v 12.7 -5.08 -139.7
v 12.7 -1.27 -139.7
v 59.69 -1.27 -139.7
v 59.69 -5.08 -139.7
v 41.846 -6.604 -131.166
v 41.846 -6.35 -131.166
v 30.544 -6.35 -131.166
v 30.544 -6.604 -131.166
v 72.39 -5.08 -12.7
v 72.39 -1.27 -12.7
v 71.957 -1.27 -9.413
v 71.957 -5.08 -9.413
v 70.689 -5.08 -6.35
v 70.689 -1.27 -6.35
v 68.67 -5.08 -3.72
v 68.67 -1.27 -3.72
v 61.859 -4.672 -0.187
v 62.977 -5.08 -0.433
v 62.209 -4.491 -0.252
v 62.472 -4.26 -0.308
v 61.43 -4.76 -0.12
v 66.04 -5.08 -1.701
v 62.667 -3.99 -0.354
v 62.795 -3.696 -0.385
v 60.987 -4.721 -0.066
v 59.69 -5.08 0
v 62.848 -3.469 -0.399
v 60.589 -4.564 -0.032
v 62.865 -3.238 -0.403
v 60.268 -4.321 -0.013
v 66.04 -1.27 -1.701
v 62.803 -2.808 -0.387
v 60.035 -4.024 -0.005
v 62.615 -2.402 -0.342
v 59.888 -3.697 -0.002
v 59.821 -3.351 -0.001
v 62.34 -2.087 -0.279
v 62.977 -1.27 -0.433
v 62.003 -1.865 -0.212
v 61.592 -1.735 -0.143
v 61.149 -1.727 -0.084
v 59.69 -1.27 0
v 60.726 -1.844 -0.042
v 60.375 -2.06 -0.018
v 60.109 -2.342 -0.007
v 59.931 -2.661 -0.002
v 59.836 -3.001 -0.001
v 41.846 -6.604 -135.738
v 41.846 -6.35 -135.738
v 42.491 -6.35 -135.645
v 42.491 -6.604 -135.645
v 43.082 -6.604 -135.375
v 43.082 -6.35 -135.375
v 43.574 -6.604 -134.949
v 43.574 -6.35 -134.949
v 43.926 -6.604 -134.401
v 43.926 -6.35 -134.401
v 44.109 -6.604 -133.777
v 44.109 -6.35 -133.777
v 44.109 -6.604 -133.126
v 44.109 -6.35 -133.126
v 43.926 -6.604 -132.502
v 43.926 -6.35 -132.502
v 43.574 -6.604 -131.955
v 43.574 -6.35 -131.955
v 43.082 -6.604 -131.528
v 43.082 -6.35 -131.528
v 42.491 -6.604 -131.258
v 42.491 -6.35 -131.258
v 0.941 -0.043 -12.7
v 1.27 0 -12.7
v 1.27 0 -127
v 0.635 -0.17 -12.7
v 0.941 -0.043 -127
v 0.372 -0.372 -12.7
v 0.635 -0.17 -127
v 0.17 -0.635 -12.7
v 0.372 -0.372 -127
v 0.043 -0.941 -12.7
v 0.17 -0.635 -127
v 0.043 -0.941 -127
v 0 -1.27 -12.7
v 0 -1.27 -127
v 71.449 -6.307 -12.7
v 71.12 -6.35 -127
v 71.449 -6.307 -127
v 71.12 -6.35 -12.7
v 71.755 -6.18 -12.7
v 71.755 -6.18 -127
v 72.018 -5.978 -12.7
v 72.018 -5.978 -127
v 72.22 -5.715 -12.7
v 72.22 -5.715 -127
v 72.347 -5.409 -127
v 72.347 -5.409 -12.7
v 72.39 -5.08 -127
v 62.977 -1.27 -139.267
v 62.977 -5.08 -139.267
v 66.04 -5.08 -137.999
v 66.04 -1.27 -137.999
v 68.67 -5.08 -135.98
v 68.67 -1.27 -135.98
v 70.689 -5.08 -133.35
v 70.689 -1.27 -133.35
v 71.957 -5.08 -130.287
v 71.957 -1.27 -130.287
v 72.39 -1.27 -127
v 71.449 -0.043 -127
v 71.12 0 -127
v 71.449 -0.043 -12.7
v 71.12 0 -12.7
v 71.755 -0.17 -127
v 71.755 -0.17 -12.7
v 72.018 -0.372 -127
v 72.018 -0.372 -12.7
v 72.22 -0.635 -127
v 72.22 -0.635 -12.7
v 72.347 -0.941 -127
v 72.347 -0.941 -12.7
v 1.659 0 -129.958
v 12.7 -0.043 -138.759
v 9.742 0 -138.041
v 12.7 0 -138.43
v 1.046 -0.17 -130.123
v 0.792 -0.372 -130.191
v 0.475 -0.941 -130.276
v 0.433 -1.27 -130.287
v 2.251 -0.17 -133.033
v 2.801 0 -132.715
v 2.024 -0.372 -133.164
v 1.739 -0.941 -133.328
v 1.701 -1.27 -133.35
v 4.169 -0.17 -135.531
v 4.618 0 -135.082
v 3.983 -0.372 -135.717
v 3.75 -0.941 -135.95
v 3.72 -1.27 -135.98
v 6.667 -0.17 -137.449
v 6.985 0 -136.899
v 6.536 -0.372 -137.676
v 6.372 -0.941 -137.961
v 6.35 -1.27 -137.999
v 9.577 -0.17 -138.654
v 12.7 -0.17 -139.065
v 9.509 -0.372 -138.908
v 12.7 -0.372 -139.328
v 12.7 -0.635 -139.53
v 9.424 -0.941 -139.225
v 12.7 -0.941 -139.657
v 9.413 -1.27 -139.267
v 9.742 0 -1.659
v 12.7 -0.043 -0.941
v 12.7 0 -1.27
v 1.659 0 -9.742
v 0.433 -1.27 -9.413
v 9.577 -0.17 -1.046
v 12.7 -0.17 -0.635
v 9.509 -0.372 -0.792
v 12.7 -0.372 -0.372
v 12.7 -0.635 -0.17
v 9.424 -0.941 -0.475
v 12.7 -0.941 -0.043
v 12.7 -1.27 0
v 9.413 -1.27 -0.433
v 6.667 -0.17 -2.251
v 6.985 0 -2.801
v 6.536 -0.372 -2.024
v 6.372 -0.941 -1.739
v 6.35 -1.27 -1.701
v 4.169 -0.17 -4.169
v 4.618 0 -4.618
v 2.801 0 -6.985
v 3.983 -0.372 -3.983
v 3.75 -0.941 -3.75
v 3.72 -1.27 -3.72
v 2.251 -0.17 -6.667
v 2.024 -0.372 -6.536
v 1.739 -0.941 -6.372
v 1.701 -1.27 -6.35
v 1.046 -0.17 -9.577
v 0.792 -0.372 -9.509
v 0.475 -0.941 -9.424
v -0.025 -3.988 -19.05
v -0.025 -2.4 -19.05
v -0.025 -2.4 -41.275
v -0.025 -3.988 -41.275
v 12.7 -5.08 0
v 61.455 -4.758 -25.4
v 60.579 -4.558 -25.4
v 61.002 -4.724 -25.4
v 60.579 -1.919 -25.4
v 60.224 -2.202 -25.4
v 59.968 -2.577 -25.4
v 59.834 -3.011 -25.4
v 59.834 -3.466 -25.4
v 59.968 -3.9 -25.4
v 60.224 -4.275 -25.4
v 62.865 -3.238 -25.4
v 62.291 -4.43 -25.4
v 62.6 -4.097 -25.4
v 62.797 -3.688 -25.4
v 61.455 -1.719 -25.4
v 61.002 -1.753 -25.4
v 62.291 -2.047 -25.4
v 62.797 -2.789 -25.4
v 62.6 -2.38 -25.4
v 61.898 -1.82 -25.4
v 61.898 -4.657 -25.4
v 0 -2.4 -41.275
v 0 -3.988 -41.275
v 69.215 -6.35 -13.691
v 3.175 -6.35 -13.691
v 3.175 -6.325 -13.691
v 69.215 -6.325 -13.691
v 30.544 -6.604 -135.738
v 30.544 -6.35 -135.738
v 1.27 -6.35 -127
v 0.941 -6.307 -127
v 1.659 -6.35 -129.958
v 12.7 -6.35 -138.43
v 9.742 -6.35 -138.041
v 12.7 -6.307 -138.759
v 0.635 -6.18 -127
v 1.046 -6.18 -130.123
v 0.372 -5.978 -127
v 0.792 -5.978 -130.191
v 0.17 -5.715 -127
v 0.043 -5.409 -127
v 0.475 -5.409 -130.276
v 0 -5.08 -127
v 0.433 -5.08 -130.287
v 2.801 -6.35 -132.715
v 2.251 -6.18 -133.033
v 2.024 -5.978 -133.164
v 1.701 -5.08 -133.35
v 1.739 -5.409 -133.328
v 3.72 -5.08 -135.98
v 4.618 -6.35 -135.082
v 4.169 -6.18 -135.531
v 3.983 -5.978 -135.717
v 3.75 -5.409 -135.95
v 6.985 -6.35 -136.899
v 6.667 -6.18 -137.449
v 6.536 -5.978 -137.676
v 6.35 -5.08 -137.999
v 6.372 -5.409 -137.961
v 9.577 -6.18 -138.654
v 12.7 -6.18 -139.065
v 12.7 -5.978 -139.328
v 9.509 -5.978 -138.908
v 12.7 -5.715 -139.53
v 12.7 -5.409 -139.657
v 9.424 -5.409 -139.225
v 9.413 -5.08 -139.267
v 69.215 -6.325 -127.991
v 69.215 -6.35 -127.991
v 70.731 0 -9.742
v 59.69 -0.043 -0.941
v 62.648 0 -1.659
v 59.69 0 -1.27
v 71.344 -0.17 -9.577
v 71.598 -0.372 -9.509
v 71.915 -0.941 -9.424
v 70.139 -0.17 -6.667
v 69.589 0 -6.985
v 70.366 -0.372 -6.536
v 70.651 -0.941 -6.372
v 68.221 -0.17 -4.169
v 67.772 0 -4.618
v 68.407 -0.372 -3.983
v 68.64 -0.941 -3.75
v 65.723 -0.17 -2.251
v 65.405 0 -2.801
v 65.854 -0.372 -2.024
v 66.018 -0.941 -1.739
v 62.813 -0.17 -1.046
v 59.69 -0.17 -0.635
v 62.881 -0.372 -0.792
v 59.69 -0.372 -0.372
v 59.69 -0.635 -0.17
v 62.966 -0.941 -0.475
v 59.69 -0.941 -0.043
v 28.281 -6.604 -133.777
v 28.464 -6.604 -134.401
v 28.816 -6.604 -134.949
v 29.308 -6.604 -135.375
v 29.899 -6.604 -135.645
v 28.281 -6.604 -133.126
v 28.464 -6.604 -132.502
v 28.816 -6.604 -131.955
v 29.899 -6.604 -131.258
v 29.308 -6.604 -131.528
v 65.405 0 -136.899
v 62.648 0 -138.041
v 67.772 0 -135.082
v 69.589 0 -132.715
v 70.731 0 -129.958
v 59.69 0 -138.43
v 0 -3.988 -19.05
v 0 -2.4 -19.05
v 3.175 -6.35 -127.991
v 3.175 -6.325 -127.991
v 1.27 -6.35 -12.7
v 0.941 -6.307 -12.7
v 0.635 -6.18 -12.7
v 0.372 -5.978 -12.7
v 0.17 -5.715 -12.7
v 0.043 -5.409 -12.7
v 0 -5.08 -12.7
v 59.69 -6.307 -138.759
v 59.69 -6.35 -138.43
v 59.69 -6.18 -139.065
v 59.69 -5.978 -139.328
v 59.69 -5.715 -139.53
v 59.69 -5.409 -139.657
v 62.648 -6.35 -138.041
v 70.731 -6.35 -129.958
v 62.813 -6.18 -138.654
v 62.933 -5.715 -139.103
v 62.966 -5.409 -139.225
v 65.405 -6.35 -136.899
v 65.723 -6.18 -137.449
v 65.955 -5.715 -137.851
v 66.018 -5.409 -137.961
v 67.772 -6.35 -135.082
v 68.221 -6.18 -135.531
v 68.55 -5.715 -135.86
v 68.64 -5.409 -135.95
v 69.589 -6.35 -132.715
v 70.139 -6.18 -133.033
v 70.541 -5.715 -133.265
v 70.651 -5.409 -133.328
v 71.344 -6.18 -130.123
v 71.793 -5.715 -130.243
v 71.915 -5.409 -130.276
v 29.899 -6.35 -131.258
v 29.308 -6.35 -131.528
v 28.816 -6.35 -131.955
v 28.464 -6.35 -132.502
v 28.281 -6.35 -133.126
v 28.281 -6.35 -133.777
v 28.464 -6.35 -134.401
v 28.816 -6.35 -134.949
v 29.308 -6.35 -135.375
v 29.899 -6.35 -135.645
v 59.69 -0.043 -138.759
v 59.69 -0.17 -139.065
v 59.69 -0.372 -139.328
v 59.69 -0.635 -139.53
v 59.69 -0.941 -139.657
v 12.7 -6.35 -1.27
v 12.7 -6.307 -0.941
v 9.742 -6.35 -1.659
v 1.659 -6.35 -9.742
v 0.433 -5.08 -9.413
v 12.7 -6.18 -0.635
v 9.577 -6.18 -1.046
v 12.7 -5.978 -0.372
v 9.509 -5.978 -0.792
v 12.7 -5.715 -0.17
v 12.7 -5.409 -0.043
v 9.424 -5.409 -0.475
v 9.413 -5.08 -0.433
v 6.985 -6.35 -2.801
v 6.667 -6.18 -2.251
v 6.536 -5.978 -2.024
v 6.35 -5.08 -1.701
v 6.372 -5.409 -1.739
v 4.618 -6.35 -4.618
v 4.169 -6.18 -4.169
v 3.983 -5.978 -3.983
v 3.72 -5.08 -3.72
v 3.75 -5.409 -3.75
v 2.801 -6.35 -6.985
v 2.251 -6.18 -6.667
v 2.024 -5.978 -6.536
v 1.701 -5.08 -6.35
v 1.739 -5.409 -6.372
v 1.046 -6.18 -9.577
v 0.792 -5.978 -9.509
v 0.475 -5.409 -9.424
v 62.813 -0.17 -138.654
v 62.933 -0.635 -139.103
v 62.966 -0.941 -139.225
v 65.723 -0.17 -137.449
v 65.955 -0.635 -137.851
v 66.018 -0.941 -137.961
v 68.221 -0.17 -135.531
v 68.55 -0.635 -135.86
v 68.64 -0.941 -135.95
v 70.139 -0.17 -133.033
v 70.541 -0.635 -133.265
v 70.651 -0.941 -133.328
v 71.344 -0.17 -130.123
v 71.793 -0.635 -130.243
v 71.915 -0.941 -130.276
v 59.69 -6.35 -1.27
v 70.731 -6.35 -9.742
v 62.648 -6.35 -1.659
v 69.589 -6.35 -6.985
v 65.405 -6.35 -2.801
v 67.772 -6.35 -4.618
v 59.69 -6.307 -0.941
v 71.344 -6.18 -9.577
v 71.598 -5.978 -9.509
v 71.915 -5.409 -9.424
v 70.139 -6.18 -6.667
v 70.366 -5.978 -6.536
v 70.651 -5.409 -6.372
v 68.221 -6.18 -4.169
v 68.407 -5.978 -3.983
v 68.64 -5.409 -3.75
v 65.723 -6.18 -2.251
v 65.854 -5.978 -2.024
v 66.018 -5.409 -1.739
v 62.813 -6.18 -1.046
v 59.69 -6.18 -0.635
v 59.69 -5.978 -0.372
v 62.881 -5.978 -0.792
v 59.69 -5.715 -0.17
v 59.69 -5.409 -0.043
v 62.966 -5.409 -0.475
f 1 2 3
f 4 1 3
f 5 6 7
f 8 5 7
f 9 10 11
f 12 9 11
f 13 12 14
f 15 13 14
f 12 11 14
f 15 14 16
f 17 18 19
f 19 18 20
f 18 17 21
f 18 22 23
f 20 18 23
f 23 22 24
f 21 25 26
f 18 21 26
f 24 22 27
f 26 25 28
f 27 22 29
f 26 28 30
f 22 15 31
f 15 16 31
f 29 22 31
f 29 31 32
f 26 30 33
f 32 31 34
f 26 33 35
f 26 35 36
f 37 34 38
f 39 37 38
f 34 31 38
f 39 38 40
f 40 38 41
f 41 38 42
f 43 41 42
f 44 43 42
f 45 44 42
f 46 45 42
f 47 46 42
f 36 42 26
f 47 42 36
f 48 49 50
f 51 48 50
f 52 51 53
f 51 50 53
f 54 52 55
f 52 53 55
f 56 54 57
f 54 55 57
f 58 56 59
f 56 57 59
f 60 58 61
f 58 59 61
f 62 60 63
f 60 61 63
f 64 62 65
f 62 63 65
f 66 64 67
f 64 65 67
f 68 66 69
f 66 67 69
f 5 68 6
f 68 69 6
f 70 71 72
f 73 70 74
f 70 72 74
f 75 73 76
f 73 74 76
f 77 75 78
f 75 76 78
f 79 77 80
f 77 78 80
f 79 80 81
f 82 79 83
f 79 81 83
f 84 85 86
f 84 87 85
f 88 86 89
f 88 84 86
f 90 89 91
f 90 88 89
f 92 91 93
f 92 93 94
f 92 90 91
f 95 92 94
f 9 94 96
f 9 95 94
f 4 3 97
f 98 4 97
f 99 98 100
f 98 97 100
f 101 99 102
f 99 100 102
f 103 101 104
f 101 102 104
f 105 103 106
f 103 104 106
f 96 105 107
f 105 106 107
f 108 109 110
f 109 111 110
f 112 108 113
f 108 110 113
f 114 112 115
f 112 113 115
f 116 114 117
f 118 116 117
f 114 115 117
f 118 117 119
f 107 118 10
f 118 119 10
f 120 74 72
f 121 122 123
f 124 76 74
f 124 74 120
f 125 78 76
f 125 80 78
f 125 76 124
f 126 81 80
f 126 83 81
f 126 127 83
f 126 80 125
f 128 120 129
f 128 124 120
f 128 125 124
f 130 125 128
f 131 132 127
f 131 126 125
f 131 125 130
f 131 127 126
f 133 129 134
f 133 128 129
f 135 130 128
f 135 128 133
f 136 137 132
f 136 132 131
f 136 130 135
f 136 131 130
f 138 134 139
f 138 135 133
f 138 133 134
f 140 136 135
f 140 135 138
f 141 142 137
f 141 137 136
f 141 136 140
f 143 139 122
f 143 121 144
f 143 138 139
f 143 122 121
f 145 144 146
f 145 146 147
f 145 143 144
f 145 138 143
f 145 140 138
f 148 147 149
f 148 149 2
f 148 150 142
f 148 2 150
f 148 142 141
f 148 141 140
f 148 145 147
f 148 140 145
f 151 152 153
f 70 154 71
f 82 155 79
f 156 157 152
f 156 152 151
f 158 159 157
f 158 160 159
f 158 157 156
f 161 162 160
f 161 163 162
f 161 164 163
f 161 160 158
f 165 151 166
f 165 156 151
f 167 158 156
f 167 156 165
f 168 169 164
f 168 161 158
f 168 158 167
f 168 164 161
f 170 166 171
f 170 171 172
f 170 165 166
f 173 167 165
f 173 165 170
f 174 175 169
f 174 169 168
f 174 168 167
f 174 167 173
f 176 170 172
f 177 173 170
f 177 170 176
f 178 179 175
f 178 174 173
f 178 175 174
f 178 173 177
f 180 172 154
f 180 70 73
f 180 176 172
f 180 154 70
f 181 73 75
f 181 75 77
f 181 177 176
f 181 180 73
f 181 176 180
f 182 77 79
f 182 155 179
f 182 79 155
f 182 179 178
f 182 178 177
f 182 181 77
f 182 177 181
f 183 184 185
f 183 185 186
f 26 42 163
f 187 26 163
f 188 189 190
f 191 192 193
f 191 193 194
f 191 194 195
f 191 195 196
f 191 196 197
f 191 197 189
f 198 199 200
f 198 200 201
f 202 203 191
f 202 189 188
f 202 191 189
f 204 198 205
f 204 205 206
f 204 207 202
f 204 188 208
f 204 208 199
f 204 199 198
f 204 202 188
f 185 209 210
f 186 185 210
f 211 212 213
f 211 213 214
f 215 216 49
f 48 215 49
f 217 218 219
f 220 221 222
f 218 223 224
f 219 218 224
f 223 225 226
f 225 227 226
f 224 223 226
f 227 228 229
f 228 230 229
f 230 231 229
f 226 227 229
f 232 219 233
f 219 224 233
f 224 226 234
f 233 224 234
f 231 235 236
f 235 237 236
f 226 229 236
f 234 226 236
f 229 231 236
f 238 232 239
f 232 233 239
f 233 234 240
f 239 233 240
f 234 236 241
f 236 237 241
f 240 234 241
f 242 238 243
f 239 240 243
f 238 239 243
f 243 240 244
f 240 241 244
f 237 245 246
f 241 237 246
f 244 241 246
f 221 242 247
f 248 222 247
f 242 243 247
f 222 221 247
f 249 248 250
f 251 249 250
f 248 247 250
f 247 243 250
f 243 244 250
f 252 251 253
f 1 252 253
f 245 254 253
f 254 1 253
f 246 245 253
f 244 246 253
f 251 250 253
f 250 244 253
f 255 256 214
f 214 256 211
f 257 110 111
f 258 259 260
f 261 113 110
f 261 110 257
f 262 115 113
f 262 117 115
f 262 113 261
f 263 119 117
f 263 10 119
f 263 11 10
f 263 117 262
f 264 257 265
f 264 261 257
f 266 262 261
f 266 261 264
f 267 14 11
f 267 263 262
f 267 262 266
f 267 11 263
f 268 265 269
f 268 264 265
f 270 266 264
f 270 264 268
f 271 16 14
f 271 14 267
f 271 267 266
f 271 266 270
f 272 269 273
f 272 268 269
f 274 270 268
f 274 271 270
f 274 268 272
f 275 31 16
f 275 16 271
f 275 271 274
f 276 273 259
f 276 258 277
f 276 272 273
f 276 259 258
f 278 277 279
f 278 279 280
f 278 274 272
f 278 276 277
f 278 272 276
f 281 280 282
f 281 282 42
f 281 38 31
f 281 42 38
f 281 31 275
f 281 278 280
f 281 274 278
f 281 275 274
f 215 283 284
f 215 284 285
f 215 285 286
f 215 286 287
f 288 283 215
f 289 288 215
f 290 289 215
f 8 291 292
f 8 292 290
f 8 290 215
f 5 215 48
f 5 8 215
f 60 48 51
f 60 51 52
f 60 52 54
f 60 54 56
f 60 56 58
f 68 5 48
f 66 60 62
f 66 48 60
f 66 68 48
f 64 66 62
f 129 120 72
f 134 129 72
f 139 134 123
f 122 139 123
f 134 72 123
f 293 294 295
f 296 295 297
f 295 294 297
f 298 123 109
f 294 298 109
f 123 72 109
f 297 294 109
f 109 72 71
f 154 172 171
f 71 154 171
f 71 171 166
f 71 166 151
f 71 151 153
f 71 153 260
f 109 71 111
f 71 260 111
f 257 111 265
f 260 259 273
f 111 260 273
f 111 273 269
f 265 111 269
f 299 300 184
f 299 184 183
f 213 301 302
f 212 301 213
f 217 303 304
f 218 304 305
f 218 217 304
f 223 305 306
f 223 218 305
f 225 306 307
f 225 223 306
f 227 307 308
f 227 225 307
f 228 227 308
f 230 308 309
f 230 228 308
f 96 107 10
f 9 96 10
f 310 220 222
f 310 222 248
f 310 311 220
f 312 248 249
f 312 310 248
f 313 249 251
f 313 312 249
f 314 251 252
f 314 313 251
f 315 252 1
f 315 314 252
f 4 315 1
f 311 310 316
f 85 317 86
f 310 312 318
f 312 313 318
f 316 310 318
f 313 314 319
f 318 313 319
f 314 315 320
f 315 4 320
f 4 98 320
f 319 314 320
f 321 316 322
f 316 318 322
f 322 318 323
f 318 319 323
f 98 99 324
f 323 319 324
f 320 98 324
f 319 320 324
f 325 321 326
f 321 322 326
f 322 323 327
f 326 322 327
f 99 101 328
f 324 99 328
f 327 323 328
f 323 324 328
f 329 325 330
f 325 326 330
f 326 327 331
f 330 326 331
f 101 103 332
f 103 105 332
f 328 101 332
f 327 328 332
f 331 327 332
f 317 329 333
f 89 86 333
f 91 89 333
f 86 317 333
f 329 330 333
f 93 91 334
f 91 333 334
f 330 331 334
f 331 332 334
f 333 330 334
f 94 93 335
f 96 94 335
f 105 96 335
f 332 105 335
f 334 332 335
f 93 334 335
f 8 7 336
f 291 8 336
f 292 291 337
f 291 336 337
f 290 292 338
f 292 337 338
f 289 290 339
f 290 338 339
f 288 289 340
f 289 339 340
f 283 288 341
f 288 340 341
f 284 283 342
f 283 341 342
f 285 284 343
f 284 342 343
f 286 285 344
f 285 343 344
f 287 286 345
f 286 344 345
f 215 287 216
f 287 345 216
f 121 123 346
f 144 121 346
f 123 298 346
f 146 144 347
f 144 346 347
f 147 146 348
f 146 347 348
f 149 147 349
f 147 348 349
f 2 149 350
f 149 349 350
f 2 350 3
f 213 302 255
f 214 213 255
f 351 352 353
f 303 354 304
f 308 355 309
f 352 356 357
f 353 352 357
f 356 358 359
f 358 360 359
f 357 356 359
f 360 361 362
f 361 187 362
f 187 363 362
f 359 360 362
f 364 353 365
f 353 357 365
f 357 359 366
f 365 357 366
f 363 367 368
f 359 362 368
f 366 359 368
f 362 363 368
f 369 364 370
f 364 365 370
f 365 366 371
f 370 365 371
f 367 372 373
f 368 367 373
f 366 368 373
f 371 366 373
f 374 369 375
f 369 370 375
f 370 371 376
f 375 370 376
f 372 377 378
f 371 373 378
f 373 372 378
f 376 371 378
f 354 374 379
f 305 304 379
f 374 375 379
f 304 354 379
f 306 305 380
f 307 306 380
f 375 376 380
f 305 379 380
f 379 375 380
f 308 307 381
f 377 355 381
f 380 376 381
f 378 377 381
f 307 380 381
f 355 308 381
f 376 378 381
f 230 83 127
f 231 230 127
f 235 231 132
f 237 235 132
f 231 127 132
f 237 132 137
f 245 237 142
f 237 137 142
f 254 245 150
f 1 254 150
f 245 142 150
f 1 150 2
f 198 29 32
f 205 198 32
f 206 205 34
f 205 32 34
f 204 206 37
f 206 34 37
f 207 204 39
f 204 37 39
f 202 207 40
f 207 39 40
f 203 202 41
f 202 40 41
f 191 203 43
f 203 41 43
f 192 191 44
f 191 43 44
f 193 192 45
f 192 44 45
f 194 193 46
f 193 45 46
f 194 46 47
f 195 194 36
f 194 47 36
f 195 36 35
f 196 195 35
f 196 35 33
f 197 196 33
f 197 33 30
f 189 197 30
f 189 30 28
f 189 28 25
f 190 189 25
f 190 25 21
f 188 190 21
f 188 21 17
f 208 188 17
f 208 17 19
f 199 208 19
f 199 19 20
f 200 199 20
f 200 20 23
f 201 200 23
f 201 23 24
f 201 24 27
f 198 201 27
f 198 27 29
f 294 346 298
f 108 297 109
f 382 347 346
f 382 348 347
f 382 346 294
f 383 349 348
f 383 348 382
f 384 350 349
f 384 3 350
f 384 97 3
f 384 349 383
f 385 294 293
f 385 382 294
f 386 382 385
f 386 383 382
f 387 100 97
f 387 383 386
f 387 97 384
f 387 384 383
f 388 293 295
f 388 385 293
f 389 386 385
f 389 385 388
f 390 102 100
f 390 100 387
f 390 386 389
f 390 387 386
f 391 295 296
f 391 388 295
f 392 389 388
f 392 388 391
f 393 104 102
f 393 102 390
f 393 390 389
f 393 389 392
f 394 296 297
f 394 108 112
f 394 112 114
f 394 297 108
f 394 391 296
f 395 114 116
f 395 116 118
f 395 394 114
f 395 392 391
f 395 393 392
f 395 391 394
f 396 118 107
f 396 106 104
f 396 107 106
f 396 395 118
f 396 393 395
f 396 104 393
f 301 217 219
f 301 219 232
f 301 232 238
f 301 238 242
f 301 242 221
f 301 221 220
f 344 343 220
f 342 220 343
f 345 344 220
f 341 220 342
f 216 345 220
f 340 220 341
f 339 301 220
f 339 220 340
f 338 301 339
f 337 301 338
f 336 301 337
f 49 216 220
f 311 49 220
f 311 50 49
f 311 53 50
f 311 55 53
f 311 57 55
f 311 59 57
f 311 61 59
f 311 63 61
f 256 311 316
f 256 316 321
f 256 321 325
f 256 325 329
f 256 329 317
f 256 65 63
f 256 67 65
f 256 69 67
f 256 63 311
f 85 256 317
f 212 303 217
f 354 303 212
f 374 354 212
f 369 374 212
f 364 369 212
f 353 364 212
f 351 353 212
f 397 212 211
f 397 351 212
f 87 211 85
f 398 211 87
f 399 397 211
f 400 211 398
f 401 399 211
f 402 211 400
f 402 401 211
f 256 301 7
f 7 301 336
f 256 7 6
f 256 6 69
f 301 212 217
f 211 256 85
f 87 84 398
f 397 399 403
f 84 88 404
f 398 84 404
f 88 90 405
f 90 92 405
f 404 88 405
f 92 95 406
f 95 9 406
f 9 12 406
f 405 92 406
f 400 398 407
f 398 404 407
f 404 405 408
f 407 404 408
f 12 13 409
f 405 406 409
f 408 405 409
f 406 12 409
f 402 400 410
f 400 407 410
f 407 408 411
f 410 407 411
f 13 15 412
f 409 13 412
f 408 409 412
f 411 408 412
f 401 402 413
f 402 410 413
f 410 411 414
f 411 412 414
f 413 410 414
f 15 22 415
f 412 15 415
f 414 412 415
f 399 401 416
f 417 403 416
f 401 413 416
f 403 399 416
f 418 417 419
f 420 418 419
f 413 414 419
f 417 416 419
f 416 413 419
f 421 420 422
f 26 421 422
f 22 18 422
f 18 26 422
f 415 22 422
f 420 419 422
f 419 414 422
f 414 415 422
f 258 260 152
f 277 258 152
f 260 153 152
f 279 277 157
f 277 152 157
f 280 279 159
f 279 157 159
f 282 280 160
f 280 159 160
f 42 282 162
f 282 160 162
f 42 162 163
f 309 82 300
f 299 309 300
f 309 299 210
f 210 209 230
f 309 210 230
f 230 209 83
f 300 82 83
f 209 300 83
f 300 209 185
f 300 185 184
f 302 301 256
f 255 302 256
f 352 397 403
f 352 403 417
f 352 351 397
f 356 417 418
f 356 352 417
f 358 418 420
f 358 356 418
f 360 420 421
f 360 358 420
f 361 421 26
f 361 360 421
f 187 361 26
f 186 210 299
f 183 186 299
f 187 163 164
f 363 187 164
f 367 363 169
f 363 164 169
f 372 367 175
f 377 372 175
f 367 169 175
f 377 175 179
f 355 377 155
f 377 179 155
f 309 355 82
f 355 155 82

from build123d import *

# Parameters (mm, degrees)
F1_DEPTH  = 6.35
F3_DEPTH  = 0.254
F4_R      = 1.27
F5_W      = 66.04
F5_H      = 114.3
F6_DEPTH  = 0.0254
F8_W      = 1.5875
F8_H      = 22.225
F9_DEPTH  = 0.0254
F11_R     = 1.524
F12_DEPTH = 25.4


with BuildPart() as f1:
    # F0 (on Front) → F1 (new body)
    with BuildSketch(Plane.XZ):
        with BuildLine():
            Line((59.69, 0), (12.7, 0))
            ThreePointArc((12.7, 0), (3.7197438789, -3.7197438789), (0, -12.7))
            Line((0, -12.7), (0, -127))
            ThreePointArc((0, -127), (3.7197438789, -135.9802561211), (12.7, -139.7))
            Line((12.7, -139.7), (59.69, -139.7))
            ThreePointArc((59.69, -139.7), (68.6702561211, -135.9802561211), (72.39, -127))
            Line((72.39, -127), (72.39, -12.7))
            ThreePointArc((72.39, -12.7), (68.6702561211, -3.7197438789), (59.69, 0))
        make_face()
    extrude(amount=F1_DEPTH)

    # F2 (on face) → F3 (join)
    with BuildSketch(Plane.XZ.offset(6.35)):
        with BuildLine():
            Line((41.8465, -131.1656), (30.5435, -131.1656))
            ThreePointArc((30.5435, -131.1656), (28.2575, -133.4516), (30.5435, -135.7376))
            Line((30.5435, -135.7376), (41.8465, -135.7376))
            ThreePointArc((41.8465, -135.7376), (44.1325, -133.4516), (41.8465, -131.1656))
        make_face()
    extrude(amount=F3_DEPTH)

    # F4
    f4_edges = [f1.edges().sort_by_distance(p)[0] for p in [
        (72.39, -6.35, -69.85),
        (72.39, 0, -69.85),
    ]]
    fillet(f4_edges, radius=F4_R)

    # F5 (on face) → F6 (cut)
    with BuildSketch(Plane.XZ.offset(6.35)):
        with Locations((36.195, -70.8406)):
            Rectangle(F5_W, F5_H)
    extrude(amount=-F6_DEPTH, mode=Mode.SUBTRACT)

    # F8 (on offset) → F9 (join)
    with BuildSketch(Plane(origin=(0, 0, 0), x_dir=(0, -1, 0), z_dir=(-1, 0, 0))):
        with Locations((3.19405, -30.1625)):
            Rectangle(F8_W, F8_H)
    extrude(amount=F9_DEPTH)

    # F11 (on offset) → F12 (cut)
    with BuildSketch(Plane.XY):
        with Locations((61.3411824728, -3.2385)):
            Circle(F11_R)
    extrude(amount=-F12_DEPTH, mode=Mode.SUBTRACT)


solid = f1.part
